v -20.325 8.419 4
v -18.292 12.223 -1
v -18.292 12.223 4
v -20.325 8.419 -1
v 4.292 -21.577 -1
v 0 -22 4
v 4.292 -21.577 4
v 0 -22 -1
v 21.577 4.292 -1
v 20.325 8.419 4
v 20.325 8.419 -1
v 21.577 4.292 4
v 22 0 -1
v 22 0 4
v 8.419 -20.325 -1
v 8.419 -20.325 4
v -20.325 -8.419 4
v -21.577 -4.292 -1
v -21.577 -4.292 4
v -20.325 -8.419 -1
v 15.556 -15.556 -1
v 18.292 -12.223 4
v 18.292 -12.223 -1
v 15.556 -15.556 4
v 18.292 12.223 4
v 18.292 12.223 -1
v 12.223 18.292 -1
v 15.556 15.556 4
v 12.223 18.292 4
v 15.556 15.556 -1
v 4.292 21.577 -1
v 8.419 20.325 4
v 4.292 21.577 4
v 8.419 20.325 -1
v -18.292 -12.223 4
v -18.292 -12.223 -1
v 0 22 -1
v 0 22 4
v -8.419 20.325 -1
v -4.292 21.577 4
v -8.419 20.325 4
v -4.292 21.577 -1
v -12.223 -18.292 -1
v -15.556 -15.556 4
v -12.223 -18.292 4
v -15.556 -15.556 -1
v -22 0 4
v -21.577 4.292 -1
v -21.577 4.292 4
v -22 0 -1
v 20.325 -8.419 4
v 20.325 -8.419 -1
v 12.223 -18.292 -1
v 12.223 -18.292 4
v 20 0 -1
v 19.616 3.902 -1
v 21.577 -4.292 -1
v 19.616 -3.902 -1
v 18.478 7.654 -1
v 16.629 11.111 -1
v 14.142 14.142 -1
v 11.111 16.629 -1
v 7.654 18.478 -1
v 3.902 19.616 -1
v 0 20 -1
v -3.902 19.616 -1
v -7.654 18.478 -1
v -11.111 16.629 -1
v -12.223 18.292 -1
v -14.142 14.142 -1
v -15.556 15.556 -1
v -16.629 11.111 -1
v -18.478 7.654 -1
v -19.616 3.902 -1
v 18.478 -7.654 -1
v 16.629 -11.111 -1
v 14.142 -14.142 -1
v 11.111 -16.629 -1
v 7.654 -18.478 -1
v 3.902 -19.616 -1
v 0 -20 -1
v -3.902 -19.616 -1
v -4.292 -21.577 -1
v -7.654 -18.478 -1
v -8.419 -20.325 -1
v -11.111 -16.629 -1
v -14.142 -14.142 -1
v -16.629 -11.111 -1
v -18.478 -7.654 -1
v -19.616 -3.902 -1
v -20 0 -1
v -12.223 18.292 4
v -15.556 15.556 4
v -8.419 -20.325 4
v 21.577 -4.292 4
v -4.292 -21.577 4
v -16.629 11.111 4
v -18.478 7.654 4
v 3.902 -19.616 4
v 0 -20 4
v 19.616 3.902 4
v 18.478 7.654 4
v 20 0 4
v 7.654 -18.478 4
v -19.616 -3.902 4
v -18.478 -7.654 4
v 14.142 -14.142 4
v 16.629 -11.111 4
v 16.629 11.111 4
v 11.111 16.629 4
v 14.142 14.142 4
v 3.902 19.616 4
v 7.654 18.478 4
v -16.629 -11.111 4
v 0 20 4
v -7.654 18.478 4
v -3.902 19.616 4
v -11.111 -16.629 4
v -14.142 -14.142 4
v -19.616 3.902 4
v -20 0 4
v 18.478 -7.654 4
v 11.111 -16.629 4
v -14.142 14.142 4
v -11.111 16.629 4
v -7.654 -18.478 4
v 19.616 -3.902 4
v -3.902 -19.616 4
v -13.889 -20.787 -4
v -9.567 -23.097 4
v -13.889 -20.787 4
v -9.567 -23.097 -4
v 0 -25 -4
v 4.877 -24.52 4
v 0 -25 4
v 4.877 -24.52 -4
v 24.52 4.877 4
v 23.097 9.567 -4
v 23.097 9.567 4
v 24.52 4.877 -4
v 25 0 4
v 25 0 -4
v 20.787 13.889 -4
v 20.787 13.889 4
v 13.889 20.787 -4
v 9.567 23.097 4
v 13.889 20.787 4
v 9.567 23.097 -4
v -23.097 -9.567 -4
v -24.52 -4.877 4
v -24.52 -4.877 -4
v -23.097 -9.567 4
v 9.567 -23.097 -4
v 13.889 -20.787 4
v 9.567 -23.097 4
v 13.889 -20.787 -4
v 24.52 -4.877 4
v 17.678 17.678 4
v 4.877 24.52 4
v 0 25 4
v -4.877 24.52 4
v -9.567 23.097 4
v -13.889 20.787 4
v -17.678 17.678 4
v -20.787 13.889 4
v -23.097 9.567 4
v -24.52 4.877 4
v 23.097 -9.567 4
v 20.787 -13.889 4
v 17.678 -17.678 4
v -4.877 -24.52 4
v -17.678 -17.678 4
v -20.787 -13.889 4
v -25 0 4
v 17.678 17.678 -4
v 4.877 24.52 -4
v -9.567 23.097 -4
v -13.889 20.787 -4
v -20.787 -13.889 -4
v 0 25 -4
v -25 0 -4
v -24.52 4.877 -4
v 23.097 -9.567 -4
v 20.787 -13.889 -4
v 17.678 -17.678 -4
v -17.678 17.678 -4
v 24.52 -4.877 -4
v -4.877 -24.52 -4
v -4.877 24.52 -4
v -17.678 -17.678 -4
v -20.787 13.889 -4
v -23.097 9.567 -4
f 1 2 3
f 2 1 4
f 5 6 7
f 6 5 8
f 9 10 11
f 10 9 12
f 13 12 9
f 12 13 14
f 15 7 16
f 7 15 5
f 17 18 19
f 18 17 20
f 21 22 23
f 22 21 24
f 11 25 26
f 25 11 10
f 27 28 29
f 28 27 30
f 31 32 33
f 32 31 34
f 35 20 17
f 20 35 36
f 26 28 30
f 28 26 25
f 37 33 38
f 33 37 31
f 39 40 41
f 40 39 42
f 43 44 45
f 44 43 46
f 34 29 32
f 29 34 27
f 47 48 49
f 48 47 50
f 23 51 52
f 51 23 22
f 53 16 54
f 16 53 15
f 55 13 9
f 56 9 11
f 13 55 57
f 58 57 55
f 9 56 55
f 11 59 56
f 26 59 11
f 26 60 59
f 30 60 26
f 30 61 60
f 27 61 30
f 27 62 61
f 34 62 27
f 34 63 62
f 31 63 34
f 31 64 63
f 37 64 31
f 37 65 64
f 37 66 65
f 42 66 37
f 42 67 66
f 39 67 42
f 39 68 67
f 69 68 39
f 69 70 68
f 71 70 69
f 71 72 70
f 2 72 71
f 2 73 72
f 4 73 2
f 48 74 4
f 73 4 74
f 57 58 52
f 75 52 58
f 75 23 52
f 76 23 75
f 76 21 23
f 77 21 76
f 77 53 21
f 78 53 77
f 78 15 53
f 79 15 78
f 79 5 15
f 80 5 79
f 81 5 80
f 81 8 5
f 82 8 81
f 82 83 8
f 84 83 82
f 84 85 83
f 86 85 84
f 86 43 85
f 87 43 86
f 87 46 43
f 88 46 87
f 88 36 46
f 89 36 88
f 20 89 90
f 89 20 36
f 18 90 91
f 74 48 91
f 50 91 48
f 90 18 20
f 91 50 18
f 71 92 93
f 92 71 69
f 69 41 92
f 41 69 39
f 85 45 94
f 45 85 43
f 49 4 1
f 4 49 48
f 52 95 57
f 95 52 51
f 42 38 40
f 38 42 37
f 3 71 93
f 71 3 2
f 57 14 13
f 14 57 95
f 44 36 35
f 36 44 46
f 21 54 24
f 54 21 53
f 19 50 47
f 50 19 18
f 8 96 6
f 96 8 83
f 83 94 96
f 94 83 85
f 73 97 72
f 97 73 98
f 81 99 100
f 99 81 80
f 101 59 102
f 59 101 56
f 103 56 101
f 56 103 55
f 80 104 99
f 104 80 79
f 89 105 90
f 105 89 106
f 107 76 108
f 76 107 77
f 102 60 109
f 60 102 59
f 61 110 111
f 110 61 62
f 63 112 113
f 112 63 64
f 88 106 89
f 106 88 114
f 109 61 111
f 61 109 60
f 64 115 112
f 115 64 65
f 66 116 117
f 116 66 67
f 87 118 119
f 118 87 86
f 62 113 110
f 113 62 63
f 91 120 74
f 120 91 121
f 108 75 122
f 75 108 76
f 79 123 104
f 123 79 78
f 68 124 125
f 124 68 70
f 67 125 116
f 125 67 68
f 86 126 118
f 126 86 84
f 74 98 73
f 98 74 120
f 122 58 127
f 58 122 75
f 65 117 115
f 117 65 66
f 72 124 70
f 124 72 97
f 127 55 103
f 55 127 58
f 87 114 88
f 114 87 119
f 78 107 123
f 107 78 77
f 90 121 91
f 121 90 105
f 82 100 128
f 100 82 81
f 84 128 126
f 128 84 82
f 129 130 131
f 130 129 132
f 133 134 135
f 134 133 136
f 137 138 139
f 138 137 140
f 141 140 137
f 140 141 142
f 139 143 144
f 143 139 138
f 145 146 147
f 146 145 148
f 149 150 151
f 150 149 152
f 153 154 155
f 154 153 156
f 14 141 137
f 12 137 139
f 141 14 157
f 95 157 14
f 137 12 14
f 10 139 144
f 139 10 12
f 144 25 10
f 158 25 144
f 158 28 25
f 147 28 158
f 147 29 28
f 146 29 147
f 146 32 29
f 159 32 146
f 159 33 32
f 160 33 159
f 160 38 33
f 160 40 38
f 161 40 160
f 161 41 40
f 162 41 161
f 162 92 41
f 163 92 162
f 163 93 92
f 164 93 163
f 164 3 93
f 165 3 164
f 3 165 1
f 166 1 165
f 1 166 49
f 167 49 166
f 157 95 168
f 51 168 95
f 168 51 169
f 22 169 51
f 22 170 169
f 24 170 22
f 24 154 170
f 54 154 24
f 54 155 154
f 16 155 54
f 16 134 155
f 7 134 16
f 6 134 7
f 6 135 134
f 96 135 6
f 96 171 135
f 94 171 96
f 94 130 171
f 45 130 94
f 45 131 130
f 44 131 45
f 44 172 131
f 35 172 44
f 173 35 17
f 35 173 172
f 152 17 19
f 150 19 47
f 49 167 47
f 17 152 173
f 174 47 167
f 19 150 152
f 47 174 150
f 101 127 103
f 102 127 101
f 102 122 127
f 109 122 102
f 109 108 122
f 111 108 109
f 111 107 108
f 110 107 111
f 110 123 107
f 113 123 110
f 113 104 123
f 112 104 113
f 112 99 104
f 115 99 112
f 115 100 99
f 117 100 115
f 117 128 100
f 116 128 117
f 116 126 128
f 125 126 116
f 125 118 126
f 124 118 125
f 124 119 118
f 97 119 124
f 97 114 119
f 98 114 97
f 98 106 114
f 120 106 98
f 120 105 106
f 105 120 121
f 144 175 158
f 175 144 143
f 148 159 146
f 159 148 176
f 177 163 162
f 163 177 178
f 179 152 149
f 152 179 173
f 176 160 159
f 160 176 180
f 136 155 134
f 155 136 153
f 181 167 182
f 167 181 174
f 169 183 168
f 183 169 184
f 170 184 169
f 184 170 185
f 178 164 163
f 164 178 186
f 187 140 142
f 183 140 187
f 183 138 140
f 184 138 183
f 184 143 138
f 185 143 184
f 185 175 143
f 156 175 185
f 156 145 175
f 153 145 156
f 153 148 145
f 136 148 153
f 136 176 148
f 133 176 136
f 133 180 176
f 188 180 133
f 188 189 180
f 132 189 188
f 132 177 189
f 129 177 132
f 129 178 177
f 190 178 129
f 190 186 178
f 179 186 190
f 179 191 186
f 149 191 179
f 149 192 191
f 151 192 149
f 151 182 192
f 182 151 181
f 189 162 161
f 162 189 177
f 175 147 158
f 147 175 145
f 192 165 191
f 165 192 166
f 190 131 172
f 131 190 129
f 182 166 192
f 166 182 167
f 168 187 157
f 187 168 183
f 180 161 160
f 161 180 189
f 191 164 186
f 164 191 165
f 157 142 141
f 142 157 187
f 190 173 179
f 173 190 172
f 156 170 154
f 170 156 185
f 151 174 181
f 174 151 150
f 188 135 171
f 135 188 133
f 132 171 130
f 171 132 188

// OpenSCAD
$fn=32;

module octagon(R, H){
	difference(){
		cylinder (h = H, r=R, center = true);
		
		difference(){
			translate([0,0,2.5])color([1,0,0])cylinder (h = H-1, r=R-3, center = true);
			translate([0,0,2.5])color([1,0,0])cylinder (h = H, r=R-5, center = true);
			}
		}
}

module elephant(){
    module top(){
        translate([0,0,1])cube([10,2,1], center=true);
        translate([0,0,1])cube([2,10,1], center=true);
        
        translate([5,0,1])cube([1,5,1], center=true);
        translate([-5,0,1])cube([1,5,1], center=true);
        
        translate([0,5,1])cube([5,1,1], center=true);
        translate([0,-5,1])cube([5,1,1], center=true);
    }
	difference(){
        octagon(10,4);
        scale([1,1,2])rotate([0,0,45/2])top();
	}
}

module horse(){
   module top(){
        translate([0,0,1])cube([10,2,1], center=true);
        translate([0,0,1])cube([2,10,1], center=true);
        
        translate([5,0,1])cube([1,5,1], center=true);
        translate([-5,0,1])cube([1,5,1], center=true);
        
        translate([0,5,1])cube([5,1,1], center=true);
        translate([0,-5,1])cube([5,1,1], center=true);
    }

	difference(){
		octagon(10,4);
		scale([0.5,0.5,2])rotate([0,0,45/2])top();
	}
}


octagon(25, 8);
//elephant();
//horse();
